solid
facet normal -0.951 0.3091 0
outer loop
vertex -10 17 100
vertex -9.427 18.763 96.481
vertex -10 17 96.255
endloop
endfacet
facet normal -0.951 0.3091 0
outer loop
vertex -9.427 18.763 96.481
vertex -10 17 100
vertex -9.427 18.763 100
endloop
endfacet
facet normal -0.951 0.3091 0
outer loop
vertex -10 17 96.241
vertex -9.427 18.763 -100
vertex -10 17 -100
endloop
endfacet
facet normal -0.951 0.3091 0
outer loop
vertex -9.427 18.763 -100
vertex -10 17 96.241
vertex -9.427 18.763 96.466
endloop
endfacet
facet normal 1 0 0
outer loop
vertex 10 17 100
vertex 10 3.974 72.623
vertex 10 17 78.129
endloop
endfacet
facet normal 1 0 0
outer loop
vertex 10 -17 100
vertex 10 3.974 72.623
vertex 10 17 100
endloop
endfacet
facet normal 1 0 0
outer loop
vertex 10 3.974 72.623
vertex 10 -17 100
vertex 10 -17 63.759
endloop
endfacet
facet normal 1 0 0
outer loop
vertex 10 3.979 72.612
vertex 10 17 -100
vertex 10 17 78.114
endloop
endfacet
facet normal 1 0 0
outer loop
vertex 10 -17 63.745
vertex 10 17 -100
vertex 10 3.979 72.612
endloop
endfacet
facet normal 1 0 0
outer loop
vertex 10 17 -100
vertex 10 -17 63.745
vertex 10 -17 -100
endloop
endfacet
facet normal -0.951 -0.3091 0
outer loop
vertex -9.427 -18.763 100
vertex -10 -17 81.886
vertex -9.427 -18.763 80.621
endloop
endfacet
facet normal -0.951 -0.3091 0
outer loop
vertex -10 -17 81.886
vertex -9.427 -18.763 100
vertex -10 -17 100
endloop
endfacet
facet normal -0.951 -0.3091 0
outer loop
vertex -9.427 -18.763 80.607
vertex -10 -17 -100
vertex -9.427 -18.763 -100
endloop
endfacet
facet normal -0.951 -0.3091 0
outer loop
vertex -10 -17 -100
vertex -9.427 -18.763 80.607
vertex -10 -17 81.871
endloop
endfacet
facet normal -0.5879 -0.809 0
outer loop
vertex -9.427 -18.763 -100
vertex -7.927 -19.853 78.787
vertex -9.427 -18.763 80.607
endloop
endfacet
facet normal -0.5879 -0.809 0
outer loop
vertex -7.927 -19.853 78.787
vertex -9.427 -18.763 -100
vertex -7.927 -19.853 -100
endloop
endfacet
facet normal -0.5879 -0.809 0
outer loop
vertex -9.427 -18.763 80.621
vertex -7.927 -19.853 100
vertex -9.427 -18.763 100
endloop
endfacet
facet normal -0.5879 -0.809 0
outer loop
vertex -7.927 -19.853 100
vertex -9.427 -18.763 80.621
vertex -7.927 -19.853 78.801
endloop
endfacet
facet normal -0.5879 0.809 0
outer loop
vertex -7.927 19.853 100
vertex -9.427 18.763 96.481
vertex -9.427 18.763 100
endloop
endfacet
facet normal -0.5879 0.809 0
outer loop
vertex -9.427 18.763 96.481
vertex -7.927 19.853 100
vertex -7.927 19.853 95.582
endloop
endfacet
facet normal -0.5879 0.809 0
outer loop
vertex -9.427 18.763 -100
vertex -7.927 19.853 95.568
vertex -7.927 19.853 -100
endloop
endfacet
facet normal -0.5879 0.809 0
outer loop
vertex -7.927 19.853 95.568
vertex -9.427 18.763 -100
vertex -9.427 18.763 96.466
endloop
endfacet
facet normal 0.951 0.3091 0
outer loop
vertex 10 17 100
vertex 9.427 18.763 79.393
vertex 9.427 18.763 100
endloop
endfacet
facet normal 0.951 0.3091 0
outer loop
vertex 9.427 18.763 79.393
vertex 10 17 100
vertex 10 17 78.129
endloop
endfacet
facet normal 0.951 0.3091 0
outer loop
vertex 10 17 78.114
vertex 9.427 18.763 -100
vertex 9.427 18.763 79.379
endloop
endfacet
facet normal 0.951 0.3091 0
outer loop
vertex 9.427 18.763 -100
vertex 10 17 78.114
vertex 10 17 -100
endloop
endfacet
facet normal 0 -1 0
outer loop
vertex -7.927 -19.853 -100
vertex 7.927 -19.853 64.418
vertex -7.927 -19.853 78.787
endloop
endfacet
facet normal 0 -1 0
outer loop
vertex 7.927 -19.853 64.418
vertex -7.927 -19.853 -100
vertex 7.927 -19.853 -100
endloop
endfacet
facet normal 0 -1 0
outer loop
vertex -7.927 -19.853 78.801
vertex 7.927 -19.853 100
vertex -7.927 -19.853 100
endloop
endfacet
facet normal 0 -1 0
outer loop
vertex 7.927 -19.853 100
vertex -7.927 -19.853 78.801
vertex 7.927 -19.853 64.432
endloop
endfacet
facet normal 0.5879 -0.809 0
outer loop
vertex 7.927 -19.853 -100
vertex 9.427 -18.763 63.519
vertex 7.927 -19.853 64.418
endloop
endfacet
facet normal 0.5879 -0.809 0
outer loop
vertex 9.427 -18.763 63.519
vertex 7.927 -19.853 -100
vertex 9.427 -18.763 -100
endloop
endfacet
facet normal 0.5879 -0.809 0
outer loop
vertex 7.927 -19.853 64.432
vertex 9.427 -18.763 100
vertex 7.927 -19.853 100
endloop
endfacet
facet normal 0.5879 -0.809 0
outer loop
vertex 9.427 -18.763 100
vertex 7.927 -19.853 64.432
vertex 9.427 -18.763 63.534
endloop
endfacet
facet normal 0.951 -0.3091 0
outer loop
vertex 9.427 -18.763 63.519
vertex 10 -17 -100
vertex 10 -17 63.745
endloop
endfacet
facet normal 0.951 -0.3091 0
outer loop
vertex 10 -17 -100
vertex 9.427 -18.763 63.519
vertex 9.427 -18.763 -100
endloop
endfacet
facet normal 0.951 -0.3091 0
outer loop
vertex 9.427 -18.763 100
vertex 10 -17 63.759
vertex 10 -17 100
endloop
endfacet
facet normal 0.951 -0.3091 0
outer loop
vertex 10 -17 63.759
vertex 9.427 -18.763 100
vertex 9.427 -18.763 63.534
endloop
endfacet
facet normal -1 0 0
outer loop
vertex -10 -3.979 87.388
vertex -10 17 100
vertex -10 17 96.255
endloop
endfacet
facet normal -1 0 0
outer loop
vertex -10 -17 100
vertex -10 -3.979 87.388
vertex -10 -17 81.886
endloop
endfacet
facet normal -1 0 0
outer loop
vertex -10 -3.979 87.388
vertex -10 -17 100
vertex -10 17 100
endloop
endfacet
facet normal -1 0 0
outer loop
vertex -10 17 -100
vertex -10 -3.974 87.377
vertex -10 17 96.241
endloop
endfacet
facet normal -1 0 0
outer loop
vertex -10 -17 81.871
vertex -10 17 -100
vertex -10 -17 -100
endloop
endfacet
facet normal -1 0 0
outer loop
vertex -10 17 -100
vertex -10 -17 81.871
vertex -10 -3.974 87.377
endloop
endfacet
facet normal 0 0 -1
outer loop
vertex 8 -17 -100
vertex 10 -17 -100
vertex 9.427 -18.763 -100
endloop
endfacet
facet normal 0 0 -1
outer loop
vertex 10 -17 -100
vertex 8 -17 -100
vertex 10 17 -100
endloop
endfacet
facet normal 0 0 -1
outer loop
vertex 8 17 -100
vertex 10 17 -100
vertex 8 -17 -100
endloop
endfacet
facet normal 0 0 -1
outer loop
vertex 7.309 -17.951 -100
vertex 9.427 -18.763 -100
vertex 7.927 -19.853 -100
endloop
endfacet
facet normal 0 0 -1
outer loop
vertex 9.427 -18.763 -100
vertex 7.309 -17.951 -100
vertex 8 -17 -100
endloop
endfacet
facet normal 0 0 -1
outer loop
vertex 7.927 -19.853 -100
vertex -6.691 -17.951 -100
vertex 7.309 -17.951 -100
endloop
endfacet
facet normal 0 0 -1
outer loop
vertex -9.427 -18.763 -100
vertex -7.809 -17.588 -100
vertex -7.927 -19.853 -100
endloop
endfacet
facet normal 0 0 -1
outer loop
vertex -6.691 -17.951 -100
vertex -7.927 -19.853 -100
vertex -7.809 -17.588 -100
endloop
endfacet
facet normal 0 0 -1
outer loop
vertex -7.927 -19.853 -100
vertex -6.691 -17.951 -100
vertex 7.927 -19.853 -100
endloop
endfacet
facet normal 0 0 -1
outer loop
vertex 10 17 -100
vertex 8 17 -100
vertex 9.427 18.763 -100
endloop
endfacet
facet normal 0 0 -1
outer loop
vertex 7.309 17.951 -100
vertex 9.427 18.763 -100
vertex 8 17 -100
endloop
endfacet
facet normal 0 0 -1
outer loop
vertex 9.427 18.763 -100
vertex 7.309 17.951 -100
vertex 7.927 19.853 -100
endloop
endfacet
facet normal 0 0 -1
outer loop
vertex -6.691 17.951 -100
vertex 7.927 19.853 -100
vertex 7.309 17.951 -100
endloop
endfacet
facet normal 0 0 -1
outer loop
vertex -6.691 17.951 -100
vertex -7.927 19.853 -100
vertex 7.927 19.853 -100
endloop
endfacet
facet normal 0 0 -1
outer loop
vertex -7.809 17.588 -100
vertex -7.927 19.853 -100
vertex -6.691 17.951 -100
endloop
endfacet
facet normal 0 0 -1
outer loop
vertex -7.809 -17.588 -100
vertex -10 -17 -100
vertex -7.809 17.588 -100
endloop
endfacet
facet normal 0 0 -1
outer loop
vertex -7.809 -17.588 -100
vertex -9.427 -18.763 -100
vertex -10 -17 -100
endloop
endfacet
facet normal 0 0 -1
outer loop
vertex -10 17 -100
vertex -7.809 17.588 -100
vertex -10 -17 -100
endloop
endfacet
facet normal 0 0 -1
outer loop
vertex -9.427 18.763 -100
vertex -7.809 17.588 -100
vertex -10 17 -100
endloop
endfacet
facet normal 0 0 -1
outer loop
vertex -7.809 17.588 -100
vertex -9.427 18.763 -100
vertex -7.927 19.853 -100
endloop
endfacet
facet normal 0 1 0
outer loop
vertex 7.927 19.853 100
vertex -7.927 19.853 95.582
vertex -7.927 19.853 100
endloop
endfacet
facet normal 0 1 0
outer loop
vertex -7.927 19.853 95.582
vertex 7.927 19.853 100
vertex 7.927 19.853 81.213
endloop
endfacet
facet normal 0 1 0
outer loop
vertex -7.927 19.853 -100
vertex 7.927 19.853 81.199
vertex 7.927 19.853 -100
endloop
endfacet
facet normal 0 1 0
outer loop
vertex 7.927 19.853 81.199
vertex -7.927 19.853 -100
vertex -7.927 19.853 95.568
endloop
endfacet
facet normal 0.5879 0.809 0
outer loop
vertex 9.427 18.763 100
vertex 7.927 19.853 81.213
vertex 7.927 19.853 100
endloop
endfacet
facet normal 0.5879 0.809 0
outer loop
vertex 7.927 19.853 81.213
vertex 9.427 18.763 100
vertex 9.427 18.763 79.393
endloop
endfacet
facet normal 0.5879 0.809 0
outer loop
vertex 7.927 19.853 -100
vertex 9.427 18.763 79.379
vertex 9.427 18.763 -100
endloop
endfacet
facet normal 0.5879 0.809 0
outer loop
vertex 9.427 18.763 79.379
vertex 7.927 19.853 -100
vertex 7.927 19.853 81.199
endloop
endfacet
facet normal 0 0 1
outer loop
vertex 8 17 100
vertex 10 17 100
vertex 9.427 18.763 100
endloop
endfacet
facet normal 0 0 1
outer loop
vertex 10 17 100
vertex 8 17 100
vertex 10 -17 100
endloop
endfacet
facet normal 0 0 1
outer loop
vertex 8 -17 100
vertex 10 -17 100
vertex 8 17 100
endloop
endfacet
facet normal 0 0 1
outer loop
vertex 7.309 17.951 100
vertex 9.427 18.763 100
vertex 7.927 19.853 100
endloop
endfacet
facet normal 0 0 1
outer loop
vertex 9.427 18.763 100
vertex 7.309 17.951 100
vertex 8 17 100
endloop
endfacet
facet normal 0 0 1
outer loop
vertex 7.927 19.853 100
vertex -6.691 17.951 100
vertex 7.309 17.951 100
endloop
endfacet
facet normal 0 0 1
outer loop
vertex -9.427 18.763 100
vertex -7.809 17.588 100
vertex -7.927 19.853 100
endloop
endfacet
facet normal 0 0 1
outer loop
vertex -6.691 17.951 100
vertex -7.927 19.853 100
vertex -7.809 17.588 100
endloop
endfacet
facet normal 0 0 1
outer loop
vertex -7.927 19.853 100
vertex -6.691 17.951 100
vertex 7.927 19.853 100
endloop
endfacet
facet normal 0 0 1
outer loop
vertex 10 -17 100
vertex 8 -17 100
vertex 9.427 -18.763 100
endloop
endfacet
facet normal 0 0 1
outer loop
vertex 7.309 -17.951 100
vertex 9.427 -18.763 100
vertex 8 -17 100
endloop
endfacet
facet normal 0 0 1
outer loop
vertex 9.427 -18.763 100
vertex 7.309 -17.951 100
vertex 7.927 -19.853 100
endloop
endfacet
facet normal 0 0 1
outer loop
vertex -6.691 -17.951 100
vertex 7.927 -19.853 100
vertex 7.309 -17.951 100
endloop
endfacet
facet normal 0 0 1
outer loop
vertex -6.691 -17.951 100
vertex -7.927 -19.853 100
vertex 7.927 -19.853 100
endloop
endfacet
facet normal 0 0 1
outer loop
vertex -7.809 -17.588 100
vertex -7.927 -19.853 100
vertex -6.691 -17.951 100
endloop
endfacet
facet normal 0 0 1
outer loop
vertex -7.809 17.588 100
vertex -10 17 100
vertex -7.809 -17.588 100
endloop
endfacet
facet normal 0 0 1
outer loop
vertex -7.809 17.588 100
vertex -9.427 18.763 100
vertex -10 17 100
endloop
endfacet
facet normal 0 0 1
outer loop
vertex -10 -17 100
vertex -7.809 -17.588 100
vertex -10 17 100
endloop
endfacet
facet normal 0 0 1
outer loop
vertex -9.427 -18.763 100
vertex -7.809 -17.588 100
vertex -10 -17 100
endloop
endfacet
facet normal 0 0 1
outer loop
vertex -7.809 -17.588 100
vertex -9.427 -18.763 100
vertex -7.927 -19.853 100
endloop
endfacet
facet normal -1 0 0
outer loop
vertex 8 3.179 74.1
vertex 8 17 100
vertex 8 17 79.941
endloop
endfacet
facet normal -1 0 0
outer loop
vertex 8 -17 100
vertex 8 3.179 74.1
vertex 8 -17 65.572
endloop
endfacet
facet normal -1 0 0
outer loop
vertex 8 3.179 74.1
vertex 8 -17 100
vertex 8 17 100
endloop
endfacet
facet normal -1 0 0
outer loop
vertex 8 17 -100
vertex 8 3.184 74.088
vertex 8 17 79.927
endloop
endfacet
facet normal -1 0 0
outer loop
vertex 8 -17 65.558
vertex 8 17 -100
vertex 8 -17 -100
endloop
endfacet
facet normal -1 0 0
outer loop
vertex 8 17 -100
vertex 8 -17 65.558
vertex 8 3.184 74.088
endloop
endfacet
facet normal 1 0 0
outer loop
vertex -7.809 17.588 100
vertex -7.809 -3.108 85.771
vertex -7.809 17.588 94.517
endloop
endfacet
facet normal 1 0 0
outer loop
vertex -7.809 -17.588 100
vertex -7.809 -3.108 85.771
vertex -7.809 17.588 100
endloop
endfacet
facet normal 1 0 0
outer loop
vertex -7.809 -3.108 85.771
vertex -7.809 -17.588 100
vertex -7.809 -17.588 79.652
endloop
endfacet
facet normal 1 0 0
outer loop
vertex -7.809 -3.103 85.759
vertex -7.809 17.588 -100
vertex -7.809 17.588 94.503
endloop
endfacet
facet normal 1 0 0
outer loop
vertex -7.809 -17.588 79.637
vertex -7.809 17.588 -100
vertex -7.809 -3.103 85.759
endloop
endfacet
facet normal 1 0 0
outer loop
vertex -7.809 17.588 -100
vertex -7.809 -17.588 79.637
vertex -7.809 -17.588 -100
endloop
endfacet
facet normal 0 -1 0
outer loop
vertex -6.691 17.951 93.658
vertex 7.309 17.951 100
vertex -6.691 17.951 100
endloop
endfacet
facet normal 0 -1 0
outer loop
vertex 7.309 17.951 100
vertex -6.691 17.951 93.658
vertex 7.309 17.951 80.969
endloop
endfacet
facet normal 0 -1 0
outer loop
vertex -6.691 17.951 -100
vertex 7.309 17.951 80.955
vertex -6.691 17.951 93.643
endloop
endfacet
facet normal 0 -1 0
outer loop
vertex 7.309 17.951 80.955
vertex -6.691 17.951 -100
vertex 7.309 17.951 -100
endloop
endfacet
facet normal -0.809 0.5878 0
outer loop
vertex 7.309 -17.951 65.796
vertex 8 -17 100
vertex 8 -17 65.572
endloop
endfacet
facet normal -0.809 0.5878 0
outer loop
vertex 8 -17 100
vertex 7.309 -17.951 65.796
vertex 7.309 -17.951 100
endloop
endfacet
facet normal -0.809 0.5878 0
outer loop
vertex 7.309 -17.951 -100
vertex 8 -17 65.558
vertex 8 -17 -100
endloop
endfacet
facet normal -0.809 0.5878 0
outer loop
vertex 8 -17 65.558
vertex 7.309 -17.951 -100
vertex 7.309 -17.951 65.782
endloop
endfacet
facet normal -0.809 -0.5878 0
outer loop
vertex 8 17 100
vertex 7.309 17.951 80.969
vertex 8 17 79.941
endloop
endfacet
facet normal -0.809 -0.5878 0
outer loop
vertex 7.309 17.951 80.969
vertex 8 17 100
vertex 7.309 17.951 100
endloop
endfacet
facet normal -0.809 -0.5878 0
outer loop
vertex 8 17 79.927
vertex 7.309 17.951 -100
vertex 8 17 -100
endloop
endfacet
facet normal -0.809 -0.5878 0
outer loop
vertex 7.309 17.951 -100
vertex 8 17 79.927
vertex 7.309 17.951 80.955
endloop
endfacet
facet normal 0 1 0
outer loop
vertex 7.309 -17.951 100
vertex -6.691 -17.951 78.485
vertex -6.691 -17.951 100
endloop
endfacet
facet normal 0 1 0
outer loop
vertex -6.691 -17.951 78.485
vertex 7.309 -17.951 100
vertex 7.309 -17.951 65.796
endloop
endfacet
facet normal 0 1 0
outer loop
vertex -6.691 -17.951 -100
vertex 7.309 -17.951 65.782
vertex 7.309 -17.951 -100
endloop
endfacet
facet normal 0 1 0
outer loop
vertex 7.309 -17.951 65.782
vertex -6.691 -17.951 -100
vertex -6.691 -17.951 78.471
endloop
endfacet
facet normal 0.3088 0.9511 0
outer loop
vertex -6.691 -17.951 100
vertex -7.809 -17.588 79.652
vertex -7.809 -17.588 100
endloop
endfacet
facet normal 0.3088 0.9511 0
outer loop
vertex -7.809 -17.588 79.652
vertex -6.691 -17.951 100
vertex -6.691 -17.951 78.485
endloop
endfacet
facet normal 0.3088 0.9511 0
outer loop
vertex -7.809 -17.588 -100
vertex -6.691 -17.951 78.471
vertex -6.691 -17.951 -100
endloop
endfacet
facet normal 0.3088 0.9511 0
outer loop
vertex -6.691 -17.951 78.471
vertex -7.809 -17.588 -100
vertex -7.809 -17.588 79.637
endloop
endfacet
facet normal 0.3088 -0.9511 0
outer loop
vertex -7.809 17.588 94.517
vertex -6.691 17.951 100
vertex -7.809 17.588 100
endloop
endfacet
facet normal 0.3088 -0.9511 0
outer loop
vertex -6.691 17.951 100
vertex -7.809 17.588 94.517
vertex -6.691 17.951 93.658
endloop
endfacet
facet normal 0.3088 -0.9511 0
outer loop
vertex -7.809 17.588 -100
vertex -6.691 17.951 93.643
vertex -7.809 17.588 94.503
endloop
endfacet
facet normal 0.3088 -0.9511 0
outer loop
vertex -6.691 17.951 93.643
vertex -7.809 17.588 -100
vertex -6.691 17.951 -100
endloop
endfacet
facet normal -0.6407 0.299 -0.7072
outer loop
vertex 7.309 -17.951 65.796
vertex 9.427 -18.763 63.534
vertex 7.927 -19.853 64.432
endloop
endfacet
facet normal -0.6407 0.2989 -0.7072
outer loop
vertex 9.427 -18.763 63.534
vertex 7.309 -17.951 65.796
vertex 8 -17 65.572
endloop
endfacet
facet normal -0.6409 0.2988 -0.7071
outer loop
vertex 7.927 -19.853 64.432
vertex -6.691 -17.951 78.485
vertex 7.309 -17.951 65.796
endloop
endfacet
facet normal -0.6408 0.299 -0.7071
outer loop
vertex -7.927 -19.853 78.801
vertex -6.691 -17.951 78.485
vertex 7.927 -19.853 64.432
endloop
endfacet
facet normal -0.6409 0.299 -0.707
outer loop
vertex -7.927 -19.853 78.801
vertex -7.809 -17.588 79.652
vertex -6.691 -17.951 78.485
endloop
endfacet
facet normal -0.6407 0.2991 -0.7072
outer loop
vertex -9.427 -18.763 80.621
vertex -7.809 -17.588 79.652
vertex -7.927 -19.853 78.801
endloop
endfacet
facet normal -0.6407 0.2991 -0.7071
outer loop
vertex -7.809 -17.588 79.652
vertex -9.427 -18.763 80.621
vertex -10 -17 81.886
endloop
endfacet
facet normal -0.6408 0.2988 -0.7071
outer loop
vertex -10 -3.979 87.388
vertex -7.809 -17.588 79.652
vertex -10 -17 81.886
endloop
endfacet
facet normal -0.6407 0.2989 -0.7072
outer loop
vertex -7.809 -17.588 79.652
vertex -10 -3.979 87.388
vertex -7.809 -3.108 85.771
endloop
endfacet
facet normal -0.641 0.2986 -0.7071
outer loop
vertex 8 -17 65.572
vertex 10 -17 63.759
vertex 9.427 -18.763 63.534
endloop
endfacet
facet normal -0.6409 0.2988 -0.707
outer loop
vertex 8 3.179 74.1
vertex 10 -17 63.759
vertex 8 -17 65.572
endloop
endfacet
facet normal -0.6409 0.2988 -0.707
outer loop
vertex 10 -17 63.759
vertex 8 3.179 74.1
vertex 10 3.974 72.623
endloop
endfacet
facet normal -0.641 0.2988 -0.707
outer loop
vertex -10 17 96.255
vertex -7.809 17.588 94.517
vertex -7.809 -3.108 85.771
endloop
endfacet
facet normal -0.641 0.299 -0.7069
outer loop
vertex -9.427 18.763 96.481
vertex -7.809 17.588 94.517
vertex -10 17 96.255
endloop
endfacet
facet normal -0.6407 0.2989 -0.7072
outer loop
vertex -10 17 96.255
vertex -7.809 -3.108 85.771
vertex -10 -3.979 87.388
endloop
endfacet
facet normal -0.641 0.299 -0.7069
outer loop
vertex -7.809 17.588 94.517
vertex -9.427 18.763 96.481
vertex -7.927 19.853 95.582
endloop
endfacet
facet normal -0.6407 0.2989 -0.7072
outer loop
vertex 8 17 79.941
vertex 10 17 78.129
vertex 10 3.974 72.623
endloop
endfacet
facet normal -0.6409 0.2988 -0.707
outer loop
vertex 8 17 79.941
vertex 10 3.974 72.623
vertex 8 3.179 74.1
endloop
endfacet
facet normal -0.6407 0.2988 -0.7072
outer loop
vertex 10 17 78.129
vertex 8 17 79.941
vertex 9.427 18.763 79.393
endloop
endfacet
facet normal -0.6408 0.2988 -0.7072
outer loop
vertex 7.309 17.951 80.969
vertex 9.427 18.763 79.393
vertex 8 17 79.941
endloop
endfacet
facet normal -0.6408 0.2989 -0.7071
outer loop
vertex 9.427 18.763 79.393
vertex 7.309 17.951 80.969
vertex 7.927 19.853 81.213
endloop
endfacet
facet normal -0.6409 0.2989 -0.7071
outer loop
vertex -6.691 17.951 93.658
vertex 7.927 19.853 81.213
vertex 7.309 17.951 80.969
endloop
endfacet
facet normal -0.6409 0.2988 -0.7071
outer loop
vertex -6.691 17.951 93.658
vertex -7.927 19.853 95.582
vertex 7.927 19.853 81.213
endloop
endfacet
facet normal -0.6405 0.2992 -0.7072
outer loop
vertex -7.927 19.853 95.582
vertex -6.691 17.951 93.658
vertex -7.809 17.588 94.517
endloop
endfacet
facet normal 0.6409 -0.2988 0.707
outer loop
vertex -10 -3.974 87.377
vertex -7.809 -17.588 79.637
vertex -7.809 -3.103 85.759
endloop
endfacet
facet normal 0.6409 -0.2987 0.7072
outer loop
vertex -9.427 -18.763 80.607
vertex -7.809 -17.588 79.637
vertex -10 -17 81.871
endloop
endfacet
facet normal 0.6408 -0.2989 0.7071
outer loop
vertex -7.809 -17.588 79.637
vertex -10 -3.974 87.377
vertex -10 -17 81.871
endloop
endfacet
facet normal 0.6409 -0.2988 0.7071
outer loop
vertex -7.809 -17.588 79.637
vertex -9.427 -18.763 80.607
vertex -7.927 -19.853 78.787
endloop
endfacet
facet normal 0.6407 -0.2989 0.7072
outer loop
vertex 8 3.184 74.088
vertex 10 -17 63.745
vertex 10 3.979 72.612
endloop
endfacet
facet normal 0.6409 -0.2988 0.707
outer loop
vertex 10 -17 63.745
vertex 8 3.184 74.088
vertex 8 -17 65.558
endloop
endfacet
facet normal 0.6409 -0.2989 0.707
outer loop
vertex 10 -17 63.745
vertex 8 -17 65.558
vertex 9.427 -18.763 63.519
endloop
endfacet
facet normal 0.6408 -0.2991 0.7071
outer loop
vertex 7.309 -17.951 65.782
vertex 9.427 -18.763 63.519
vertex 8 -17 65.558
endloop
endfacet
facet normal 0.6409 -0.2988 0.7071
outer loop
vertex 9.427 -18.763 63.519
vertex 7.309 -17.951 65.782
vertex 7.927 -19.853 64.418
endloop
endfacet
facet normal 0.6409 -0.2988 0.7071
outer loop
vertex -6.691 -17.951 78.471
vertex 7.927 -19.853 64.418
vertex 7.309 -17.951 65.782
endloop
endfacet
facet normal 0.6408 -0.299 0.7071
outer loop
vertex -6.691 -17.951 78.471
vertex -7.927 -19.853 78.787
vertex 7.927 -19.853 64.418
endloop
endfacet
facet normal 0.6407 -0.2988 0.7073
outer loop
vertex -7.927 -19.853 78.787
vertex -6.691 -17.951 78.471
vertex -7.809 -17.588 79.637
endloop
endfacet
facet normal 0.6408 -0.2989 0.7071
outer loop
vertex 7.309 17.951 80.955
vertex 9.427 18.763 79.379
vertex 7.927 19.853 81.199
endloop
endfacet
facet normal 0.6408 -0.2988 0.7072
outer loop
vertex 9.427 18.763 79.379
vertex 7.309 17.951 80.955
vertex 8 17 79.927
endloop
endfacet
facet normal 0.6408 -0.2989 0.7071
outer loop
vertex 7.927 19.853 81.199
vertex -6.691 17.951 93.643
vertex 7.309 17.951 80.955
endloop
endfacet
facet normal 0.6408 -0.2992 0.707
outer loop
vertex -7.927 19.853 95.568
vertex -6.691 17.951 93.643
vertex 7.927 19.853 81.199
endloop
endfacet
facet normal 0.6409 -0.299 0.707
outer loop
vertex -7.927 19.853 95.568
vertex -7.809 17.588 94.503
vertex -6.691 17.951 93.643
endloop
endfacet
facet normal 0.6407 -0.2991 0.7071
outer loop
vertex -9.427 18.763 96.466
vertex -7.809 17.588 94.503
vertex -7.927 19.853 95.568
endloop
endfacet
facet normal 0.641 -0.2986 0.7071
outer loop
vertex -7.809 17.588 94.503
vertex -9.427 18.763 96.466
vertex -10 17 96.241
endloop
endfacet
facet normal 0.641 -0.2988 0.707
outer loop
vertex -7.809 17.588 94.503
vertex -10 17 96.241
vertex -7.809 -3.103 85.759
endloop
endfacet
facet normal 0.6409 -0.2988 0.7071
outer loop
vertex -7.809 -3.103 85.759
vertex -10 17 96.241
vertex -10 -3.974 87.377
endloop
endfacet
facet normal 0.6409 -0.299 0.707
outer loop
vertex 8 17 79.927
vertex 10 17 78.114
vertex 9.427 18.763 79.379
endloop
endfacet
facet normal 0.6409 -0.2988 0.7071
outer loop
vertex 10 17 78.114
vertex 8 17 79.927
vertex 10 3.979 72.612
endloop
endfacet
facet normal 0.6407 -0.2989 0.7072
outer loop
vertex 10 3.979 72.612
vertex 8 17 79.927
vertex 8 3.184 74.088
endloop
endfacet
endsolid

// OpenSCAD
//$fn = 100;

module _square_bar(w, h, l, r) {
  hull() {
    for (i = [[-1, -1], [-1, 1], [1, 1], [1, -1]]) {
      translate([i[0] * (w / 2 - r), i[1] * (h / 2 - r), 0]) {
        cylinder(h = l, r = r, center = true);
      }
    }
  }
}

module square_tube(l, dim = [20, 20, 2, 3], pos = [0, 0, 0], rot = [0, 0, 0], a = [0, 0]) {
  w = dim[0];
  h = dim[1];
  d = dim[2];
  r = dim[3];

  translate(pos) {
    rotate(rot) {
      //rotate([0, 0, zrot]) {
        difference() {
          _square_bar(w, h, l, r);
          _square_bar(w - 2 * d, h - 2 * d, l + 1, r - d);


          translate([0, 0, (l - h / tan(a[0])) / 2]) {
            rotate([a[0], 0, a[1]]) {
              #cube([3 * w, 2 * h, 0.01], center = true);
            }
          }
        }
      //}
    }
  }


}


square_tube(200, [20, 40, 2, 3], a = [45, 65]);
//square_tube([20, 40, 2, 3], [50, 0, 105], [0, 200, 105], [1, 1], 0);
//square_tube([40, 20, 2, 3], [50, 0, 0],   [50, 0, 105],   [2, 2], atan2(200, -50) - 90);
//square_tube([40, 20, 2, 3], [0, 200, 0],  [0, 200, 105], [4, 4], atan2(200, -50) - 90);

//square_tube([20, 40, 2, 2], [20, 100, 0], [55, 100, 0], [0, 0], 0);
//square_tube([20, 40, 2, 2], [20,  50, 0], [55, 50, 0], [0, 0], 0);
